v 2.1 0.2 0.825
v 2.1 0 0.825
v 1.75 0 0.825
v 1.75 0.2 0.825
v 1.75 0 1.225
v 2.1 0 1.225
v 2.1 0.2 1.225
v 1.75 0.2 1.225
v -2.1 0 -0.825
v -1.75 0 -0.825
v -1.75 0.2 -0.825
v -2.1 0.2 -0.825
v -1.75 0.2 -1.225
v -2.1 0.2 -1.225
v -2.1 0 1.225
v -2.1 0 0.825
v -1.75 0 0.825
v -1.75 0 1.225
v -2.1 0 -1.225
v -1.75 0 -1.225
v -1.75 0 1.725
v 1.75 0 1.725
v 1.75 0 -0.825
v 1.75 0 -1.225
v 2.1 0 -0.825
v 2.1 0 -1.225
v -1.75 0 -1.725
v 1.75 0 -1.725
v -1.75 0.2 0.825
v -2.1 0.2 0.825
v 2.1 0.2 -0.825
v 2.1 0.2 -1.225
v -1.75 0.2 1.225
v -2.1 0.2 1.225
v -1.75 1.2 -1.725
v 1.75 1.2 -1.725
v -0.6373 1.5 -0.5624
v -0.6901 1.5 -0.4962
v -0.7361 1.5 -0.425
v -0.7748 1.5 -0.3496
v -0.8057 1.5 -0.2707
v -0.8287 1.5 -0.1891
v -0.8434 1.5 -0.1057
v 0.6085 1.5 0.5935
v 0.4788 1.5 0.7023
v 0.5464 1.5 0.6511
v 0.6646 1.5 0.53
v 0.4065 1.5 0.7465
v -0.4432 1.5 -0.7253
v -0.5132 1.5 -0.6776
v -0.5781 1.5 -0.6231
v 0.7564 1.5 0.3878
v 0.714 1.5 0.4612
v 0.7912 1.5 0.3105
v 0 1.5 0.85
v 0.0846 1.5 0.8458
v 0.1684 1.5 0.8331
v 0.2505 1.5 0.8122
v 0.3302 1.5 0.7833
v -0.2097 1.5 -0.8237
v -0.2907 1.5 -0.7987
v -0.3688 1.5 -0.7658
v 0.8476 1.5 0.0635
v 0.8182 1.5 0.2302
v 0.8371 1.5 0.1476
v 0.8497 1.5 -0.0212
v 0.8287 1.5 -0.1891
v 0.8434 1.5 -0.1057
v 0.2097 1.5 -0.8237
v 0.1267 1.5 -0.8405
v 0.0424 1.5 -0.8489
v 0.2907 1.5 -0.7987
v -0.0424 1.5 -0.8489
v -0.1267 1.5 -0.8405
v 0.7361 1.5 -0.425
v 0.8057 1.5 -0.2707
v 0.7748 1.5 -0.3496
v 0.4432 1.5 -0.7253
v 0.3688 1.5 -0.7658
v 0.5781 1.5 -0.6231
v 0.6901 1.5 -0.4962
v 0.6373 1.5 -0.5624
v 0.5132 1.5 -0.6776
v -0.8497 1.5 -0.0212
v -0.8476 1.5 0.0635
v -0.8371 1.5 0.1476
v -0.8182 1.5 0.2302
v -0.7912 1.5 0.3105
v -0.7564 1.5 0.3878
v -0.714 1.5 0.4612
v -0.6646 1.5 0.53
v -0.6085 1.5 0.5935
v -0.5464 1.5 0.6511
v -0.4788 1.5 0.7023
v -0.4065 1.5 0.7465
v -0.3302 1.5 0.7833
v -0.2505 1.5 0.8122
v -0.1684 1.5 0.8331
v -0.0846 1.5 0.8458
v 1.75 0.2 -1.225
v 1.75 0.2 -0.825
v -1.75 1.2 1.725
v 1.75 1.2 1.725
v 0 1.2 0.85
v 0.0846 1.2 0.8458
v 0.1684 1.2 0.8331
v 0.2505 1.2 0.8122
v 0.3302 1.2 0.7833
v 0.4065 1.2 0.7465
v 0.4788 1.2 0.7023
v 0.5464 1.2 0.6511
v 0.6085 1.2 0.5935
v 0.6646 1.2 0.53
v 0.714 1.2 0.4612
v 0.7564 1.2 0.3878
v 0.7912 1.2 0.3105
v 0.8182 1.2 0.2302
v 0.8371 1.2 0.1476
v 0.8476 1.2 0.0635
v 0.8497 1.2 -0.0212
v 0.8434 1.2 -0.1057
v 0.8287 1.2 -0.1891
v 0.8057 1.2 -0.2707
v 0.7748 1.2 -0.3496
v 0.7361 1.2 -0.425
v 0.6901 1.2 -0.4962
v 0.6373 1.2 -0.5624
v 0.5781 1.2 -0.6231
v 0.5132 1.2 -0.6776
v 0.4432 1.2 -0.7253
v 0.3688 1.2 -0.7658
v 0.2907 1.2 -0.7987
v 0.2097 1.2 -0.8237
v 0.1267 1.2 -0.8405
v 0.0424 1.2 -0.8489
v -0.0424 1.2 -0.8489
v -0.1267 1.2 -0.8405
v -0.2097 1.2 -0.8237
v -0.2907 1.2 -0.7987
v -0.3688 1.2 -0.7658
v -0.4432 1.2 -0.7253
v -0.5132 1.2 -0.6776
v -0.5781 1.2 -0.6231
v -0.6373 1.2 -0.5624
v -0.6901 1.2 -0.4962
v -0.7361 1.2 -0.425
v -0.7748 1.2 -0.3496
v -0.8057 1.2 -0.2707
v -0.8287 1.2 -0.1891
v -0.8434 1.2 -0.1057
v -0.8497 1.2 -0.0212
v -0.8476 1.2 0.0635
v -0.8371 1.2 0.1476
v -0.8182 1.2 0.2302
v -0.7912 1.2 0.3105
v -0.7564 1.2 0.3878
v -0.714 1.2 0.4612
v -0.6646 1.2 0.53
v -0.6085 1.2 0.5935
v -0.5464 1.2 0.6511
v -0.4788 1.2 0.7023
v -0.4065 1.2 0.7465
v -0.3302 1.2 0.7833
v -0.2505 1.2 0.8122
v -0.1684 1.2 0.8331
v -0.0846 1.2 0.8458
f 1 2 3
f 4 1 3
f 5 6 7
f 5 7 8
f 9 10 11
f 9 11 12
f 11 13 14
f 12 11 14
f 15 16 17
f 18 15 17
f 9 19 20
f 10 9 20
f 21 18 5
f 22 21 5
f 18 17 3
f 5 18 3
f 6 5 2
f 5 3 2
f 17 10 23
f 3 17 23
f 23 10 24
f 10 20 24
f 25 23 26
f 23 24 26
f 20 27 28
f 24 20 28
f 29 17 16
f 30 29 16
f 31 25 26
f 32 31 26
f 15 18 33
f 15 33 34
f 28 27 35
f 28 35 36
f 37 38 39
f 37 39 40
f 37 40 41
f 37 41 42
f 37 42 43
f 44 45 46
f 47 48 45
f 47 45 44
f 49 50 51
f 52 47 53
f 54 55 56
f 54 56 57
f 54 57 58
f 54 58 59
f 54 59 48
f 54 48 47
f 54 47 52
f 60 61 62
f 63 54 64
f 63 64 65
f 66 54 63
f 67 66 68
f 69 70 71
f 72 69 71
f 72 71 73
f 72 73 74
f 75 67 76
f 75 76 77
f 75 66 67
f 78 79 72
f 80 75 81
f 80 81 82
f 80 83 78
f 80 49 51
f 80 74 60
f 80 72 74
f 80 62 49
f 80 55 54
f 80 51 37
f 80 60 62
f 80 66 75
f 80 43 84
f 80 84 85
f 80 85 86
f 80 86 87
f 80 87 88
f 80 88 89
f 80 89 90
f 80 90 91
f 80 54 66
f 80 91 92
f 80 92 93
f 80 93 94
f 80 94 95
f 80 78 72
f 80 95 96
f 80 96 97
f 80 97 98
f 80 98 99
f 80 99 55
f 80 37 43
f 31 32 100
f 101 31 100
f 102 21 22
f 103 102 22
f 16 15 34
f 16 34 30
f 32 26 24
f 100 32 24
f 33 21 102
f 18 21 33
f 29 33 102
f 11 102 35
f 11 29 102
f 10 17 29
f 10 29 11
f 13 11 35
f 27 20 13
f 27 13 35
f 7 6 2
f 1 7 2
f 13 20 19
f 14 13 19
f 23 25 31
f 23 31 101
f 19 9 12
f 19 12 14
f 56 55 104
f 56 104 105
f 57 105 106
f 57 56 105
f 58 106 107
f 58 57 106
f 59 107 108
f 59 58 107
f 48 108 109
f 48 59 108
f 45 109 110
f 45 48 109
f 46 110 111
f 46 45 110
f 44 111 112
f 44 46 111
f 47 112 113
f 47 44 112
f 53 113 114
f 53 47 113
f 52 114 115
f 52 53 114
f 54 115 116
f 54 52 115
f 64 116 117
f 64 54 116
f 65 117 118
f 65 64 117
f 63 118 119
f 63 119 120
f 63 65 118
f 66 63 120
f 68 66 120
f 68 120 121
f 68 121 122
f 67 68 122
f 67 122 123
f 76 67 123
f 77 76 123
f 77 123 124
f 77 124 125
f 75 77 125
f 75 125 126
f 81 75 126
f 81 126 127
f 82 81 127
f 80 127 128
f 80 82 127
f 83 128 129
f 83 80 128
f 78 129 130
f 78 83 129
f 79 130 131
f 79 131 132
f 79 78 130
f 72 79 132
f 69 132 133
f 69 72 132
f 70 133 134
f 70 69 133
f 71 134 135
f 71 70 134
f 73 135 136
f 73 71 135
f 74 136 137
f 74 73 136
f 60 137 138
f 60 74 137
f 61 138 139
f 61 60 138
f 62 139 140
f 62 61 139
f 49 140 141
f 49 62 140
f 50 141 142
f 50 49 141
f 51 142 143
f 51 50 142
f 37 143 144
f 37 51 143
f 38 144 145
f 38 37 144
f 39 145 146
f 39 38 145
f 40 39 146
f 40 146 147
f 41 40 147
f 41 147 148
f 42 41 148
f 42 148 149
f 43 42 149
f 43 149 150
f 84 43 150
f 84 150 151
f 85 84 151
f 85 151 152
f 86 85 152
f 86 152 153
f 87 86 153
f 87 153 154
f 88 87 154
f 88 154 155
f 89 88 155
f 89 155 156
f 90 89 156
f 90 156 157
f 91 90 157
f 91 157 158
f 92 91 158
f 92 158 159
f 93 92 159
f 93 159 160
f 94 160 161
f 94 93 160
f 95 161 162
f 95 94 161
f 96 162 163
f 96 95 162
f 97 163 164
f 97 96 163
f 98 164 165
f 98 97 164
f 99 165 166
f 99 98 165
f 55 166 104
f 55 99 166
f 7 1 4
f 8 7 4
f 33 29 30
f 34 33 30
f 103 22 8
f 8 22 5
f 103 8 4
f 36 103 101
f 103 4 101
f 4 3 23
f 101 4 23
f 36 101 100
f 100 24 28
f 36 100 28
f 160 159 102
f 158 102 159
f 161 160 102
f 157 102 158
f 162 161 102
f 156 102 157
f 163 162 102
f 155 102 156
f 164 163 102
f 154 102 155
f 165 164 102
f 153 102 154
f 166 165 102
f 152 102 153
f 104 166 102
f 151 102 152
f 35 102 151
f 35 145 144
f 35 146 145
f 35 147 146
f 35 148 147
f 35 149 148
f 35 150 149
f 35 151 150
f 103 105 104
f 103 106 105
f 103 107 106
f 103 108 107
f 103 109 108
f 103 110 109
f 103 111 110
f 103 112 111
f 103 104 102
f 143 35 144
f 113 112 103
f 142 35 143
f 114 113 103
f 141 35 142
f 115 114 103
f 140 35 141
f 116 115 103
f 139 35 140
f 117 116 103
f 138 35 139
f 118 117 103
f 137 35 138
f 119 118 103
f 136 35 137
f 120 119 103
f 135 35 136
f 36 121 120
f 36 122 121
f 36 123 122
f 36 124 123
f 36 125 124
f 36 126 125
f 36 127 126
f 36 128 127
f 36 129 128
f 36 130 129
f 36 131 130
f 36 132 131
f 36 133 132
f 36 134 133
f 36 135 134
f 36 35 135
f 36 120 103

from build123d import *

# Parameters (mm, degrees)
SKETCH_2_W          = 3.5
SKETCH_2_H          = 3.45
EXTRUDE_1_DEPTH     = 1.5
SKETCH_3_W          = 0.35
SKETCH_3_H          = 0.4
EXTRUDE_2_DEPTH     = 0.2
SKETCH_4_W          = 3.5
SKETCH_4_H          = 3.45
SKETCH_4_R          = 0.85
CUT_EXTRUDE_1_DEPTH = 0.3


with BuildPart() as part:
    # Эскиз2 → Бобышка-Вытянуть1 (new body)
    with BuildSketch(Plane(origin=(0, 0, 0), x_dir=(1, 0, 0), z_dir=(0, 1, 0))):
        Rectangle(SKETCH_2_W, SKETCH_2_H)
    extrude(amount=EXTRUDE_1_DEPTH)

    # Эскиз3 → Бобышка-Вытянуть2 (add)
    with BuildSketch(Plane(origin=(0, 0, 0), x_dir=(-1, 0, 0), z_dir=(0, -1, 0))):
        with Locations((1.925, -1.025)):
            Rectangle(SKETCH_3_W, SKETCH_3_H)
        with Locations((1.925, 1.025)):
            Rectangle(SKETCH_3_W, SKETCH_3_H)
        with Locations((-1.925, -1.025)):
            Rectangle(SKETCH_3_W, SKETCH_3_H)
        with Locations((-1.925, 1.025)):
            Rectangle(SKETCH_3_W, SKETCH_3_H)
    extrude(amount=-EXTRUDE_2_DEPTH)

    # Эскиз4 → Вырез-Вытянуть1 (cut)
    with BuildSketch(Plane(origin=(0, 1.5, 0), x_dir=(1, 0, 0), z_dir=(0, 1, 0))):
        Rectangle(SKETCH_4_W, SKETCH_4_H)
        with Locations(Location((0, 0, 0), (0, 0, 270))):
            Circle(SKETCH_4_R, mode=Mode.SUBTRACT)
    extrude(amount=-CUT_EXTRUDE_1_DEPTH, mode=Mode.SUBTRACT)


solid = part.part
